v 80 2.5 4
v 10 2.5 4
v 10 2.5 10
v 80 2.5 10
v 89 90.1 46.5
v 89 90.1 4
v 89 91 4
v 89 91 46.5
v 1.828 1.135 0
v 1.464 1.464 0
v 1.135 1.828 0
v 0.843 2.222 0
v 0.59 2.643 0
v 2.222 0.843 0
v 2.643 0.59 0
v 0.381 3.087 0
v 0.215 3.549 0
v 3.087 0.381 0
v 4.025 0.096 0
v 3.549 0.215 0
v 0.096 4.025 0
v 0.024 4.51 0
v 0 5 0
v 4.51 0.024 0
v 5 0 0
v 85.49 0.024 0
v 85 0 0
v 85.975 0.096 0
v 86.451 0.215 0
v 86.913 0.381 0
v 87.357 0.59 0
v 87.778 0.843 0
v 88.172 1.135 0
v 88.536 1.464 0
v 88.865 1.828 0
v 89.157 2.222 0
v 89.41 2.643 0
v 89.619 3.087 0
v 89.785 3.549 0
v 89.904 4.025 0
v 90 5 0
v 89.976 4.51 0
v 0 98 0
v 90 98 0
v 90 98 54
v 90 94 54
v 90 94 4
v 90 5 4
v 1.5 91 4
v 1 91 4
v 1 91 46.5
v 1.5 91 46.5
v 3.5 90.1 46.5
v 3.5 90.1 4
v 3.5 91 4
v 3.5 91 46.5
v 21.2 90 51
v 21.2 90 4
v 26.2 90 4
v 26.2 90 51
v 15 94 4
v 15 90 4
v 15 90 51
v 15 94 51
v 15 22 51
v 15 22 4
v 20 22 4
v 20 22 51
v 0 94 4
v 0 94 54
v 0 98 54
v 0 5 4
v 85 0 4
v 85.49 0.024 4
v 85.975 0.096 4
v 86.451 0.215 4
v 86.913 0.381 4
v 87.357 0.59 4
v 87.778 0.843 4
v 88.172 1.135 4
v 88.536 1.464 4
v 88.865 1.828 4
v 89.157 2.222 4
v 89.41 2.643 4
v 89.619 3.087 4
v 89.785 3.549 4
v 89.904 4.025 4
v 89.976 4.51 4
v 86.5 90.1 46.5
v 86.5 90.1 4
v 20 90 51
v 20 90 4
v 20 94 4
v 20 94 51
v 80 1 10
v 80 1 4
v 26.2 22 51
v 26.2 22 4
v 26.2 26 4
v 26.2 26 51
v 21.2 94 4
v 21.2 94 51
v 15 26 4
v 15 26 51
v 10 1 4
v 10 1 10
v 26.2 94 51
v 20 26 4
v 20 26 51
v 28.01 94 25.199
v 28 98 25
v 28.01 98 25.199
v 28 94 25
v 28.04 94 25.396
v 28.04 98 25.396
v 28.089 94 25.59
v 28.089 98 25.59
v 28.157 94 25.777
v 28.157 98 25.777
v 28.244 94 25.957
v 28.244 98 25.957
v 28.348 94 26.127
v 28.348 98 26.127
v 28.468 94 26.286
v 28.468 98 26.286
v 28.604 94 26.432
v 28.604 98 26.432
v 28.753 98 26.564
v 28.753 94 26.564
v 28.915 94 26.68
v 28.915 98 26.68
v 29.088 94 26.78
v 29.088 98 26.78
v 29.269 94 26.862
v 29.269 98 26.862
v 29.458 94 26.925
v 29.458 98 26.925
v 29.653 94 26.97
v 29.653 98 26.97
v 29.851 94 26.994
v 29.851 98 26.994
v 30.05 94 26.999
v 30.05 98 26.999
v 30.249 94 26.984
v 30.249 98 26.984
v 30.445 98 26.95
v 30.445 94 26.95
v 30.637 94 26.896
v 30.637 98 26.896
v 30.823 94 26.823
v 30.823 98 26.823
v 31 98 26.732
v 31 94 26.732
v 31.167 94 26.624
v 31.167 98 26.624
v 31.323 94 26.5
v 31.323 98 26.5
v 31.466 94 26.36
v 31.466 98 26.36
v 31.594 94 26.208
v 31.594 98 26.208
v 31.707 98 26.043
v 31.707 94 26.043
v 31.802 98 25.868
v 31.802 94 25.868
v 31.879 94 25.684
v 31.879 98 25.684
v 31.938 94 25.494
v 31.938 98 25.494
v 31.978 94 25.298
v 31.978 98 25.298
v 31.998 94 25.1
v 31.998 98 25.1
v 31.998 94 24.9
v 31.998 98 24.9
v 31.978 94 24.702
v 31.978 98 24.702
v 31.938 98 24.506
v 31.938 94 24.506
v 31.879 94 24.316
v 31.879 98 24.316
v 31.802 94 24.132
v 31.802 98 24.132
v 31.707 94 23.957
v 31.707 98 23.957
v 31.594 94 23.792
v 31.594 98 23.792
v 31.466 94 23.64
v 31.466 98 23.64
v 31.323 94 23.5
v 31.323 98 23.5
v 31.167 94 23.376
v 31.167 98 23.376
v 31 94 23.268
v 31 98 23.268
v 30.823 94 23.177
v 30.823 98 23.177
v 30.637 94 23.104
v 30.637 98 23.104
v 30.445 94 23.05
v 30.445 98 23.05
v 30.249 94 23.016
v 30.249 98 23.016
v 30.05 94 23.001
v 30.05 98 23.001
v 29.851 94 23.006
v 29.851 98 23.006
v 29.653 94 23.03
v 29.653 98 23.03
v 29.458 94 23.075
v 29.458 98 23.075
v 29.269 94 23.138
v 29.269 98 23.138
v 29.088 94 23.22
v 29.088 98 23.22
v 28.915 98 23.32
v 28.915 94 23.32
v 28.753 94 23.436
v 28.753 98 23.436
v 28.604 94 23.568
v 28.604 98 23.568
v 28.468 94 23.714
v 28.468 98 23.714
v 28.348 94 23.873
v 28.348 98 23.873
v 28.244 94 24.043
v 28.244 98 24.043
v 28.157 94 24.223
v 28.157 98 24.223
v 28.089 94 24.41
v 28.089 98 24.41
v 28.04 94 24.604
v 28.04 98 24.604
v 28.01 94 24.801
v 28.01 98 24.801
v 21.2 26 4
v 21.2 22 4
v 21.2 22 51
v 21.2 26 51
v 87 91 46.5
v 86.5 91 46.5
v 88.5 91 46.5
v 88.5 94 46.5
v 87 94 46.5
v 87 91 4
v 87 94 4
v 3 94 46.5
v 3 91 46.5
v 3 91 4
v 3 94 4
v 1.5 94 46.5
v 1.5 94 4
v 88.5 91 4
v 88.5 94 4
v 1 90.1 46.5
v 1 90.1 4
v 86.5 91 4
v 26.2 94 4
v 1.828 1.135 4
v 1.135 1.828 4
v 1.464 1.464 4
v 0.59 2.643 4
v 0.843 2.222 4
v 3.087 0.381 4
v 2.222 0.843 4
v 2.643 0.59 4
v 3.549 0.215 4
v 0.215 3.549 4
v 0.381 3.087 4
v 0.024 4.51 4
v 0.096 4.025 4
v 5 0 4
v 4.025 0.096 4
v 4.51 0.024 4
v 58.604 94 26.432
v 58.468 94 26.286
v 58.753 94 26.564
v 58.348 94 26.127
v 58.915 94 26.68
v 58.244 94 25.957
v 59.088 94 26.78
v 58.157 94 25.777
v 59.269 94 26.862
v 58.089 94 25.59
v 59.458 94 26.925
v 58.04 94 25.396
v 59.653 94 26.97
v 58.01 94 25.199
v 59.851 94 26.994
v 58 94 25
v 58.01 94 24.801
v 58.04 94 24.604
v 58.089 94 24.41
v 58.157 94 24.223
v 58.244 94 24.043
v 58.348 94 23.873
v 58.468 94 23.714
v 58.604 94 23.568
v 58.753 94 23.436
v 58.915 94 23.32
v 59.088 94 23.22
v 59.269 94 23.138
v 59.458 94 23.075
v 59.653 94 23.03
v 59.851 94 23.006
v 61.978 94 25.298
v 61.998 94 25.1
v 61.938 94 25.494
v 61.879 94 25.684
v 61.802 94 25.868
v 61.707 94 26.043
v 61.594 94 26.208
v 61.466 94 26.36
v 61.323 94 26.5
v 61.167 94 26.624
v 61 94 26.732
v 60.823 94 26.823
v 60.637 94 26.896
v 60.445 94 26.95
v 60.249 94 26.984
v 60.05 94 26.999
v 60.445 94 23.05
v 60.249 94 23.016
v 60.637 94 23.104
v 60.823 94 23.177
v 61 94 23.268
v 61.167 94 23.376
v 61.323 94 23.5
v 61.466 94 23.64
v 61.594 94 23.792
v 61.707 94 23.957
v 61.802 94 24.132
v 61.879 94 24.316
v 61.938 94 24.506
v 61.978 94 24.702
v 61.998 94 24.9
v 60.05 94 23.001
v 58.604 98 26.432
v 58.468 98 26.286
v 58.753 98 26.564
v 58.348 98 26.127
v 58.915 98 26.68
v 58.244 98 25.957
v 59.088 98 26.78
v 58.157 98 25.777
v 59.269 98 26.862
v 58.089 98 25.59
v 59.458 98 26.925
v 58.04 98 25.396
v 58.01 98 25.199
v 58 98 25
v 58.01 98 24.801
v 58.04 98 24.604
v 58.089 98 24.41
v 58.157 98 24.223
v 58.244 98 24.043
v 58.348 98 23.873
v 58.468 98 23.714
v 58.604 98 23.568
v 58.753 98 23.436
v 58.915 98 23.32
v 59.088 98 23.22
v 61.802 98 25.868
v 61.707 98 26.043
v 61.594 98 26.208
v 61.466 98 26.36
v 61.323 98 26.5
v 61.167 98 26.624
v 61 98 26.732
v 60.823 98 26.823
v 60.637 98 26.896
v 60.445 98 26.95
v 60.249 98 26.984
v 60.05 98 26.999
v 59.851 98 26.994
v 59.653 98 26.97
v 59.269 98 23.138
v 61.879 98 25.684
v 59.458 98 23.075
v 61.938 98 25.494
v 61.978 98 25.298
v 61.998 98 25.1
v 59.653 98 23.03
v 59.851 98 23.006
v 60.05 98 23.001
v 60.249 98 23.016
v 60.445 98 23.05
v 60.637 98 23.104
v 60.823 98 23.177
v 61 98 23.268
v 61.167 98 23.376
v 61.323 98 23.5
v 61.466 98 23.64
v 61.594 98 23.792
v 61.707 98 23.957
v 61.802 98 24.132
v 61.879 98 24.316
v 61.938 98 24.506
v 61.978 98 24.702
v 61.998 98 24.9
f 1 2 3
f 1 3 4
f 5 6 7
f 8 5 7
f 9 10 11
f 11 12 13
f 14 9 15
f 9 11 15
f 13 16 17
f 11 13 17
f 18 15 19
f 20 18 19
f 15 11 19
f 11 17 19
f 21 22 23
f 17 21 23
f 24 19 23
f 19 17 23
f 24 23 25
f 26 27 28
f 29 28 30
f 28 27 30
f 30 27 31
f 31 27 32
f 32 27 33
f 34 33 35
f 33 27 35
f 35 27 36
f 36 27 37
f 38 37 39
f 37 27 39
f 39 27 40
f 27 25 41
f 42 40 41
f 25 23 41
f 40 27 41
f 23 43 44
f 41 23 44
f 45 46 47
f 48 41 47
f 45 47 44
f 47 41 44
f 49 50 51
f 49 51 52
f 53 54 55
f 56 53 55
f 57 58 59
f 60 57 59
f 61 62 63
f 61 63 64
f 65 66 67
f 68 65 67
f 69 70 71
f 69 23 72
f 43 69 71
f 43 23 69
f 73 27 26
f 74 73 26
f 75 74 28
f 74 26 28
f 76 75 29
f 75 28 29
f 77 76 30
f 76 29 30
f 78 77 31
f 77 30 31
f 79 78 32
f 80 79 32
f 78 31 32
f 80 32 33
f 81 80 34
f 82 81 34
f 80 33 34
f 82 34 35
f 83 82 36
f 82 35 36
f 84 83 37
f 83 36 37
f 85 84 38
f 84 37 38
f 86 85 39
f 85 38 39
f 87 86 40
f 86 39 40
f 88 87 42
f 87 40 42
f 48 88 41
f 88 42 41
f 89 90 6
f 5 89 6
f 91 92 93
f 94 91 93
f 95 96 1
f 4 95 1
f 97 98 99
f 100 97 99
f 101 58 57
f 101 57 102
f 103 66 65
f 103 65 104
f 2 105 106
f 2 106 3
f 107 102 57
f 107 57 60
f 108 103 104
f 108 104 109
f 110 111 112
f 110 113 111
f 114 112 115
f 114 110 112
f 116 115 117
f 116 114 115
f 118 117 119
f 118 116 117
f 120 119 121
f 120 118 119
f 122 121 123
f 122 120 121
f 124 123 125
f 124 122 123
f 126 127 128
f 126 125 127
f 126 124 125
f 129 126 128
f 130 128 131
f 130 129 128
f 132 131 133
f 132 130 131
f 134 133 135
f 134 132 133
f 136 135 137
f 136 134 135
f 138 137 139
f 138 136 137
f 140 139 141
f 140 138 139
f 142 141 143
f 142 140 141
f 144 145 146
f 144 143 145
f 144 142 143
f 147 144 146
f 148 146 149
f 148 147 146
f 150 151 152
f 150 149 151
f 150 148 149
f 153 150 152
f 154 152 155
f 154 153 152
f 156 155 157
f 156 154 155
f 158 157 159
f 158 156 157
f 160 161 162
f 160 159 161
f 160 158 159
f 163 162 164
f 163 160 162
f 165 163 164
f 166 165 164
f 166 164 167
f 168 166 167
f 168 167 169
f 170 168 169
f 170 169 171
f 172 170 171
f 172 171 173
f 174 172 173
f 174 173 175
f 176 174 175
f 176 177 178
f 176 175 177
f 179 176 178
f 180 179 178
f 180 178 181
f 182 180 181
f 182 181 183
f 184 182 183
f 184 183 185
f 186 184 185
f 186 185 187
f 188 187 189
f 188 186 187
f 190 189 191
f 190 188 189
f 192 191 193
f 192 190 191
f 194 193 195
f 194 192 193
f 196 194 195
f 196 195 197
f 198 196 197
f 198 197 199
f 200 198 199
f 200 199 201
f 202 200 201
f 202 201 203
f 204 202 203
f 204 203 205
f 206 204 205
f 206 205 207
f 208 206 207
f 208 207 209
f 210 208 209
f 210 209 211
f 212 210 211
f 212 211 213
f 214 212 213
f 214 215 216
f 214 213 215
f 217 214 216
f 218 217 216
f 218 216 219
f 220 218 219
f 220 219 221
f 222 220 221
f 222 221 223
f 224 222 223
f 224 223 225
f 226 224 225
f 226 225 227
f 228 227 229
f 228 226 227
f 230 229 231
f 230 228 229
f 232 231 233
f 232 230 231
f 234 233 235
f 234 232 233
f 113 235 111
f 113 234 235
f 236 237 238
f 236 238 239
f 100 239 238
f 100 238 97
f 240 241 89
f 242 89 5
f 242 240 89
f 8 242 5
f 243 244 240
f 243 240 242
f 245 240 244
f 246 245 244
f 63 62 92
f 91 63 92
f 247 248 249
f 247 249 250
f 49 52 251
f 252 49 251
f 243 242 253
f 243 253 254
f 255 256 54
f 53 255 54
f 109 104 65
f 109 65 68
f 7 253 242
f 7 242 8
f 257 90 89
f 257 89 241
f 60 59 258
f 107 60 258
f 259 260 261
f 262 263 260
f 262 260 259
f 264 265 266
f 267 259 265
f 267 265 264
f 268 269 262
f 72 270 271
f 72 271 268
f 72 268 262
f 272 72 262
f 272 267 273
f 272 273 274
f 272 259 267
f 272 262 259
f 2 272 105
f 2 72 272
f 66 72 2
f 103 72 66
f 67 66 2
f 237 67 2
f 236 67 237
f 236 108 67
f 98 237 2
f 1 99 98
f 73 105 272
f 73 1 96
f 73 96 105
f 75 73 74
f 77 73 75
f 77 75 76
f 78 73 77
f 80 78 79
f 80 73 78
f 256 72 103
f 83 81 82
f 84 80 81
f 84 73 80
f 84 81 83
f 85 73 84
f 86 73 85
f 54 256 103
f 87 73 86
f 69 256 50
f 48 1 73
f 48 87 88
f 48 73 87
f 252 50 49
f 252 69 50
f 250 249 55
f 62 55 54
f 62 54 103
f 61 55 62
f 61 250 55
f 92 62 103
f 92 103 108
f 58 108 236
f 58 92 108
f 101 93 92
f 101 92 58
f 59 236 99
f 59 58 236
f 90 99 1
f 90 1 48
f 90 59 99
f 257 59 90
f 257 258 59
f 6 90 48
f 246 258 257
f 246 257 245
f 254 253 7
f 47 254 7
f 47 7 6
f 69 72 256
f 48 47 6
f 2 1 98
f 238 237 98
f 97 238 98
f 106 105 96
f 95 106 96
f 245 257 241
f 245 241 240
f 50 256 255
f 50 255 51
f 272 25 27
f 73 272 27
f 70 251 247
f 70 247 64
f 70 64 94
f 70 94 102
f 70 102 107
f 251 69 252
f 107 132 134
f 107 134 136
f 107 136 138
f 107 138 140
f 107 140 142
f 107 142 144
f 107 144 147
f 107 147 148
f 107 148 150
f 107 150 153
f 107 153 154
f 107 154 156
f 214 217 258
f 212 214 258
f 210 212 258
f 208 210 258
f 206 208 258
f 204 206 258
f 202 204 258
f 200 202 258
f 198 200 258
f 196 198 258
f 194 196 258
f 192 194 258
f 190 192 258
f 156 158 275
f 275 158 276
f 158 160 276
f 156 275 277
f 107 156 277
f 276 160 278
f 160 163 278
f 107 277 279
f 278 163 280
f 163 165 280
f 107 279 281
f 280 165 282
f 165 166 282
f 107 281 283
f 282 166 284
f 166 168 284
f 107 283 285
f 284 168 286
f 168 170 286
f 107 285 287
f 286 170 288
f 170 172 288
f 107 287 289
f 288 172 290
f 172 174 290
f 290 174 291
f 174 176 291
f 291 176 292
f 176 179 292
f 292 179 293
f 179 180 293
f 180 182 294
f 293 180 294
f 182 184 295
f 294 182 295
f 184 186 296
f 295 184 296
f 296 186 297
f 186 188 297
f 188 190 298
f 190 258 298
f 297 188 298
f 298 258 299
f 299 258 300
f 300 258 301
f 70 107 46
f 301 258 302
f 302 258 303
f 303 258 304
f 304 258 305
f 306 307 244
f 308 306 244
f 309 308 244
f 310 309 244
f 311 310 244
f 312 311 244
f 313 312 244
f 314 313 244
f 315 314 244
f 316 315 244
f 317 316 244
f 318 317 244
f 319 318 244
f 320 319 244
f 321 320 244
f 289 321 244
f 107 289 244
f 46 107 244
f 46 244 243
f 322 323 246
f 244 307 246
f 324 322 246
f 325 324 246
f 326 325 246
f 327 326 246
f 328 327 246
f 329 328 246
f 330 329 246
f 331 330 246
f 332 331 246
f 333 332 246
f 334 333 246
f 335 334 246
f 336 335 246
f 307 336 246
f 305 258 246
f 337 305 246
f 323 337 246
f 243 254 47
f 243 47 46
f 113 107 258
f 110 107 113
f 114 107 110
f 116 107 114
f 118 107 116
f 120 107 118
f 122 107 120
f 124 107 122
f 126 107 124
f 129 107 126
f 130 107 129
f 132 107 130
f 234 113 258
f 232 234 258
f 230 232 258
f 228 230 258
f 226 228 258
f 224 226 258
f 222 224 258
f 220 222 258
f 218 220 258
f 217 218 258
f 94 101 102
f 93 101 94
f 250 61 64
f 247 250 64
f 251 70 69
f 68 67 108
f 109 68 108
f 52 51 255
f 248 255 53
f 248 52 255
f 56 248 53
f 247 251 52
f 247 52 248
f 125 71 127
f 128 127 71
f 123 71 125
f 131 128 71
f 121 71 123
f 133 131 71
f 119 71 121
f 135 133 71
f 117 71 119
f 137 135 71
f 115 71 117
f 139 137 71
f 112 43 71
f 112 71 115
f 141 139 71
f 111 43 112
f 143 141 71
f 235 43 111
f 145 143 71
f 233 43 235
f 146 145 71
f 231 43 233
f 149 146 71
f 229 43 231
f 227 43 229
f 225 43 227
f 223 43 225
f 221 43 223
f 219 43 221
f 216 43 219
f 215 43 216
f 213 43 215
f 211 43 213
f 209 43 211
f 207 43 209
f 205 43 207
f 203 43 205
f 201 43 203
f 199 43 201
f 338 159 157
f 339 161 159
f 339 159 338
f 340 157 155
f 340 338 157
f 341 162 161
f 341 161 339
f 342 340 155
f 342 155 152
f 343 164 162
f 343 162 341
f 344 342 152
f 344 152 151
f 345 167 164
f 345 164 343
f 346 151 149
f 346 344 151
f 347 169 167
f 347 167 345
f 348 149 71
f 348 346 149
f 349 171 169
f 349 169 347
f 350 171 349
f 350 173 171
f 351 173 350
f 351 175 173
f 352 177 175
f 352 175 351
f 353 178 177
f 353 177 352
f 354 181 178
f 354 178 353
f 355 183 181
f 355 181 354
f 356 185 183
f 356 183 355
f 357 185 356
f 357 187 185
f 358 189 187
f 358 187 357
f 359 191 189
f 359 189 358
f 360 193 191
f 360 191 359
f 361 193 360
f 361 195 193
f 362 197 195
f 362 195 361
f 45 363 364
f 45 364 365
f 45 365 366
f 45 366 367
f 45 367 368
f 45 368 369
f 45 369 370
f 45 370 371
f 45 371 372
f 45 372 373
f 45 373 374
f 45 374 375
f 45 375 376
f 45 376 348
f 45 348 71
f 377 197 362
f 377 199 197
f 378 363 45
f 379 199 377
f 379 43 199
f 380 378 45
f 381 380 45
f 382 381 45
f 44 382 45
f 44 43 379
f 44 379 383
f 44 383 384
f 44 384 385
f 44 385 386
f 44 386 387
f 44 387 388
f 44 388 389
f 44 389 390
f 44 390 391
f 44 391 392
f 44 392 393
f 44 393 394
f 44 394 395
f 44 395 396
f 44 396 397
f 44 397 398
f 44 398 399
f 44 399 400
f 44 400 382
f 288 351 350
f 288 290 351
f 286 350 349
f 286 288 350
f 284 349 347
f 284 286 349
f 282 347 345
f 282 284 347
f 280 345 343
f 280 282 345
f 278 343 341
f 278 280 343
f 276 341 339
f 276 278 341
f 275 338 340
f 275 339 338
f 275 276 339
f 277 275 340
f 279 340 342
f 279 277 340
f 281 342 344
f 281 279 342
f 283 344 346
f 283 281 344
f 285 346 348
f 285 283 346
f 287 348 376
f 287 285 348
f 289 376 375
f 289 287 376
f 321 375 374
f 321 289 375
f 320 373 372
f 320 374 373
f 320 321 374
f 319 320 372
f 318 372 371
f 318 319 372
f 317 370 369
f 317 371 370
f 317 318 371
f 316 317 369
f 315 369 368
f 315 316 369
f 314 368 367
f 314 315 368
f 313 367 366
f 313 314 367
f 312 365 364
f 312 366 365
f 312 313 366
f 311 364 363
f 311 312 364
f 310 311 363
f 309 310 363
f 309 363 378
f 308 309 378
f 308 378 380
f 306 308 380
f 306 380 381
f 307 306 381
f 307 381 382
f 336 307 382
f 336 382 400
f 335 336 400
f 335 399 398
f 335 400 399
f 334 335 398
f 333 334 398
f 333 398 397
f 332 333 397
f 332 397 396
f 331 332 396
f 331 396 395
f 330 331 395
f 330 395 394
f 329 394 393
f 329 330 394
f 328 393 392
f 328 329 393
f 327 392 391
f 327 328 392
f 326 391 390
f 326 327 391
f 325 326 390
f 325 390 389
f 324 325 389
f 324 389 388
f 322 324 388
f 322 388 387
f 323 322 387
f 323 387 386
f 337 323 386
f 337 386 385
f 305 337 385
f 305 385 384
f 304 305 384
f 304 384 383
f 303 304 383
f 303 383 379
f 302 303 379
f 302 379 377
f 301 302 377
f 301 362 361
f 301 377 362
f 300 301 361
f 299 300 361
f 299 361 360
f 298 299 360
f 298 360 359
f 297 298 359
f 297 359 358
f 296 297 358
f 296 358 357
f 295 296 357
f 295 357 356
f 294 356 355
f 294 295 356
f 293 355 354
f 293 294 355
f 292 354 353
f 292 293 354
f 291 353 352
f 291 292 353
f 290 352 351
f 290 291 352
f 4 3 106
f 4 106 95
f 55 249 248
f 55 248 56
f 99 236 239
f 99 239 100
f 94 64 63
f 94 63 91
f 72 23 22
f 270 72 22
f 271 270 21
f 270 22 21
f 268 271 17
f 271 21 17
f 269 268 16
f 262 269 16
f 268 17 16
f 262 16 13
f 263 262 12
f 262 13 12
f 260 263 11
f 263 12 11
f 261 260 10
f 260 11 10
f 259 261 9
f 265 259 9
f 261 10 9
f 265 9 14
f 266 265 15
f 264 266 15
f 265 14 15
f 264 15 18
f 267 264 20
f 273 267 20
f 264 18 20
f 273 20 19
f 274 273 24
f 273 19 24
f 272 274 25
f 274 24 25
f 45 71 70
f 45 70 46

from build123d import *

# Parameters (mm, degrees)
PAD_DEPTH         = 4
SKETCH002_W       = 90
SKETCH002_H       = 4
PAD001_DEPTH      = 54
SKETCH001_W       = 5
SKETCH001_H       = 4
PAD002_DEPTH      = 51
SKETCH005_R       = 2
POCKET_DEPTH      = 84.001
POCKET_DEPTH_BACK = -14.001
SKETCH004_W       = 70
SKETCH004_H       = 1.5
PAD003_DEPTH      = 10
SKETCH003_W       = 1.5
SKETCH003_H       = 3
SKETCH003_W_2     = 2.5
SKETCH003_H_2     = 0.9
PAD004_DEPTH      = 46.5


with BuildPart() as part:
    # Sketch → Pad (new body)
    with BuildSketch(Plane.XY):
        with BuildLine():
            Line((0, 94), (0, 5))
            ThreePointArc((0, 5), (1.464466, 1.464466), (5, 0))
            Line((5, 0), (85, 0))
            ThreePointArc((85, 0), (88.535534, 1.464466), (90, 5))
            Line((90, 5), (90, 94))
            Line((90, 94), (0, 94))
        make_face()
    extrude(amount=PAD_DEPTH)

    # Sketch002 → Pad001 (join)
    with BuildSketch(Plane.XY):
        with Locations((45, 96)):
            Rectangle(SKETCH002_W, SKETCH002_H)
    extrude(amount=PAD001_DEPTH)

    # Sketch001 → Pad002 (join)
    with BuildSketch(Plane.XY):
        with Locations((17.5, 92)):
            Rectangle(SKETCH001_W, SKETCH001_H)
        with Locations((17.5, 24)):
            Rectangle(SKETCH001_W, SKETCH001_H)
        with Locations((23.7, 92)):
            Rectangle(SKETCH001_W, SKETCH001_H)
        with Locations((23.7, 24)):
            Rectangle(SKETCH001_W, SKETCH001_H)
    extrude(amount=PAD002_DEPTH)

    # Sketch005 → Pocket (cut, two sides)
    with BuildSketch(Plane(origin=(0, 84, 0), x_dir=(-1, 0, 0), z_dir=(0, 1, 0))) as pocket_sk:
        with Locations((-30, 25)):
            Circle(SKETCH005_R)
        with Locations((-60, 25)):
            Circle(SKETCH005_R)
    extrude(amount=-POCKET_DEPTH, mode=Mode.SUBTRACT)
    extrude(pocket_sk.sketch, amount=-POCKET_DEPTH_BACK, mode=Mode.SUBTRACT)

    # Sketch004 → Pad003 (join)
    with BuildSketch(Plane.XY):
        with Locations((45, 1.75)):
            Rectangle(SKETCH004_W, SKETCH004_H)
    extrude(amount=PAD003_DEPTH)

    # Sketch003 → Pad004 (join)
    with BuildSketch(Plane.XY):
        with Locations((2.25, 92.5)):
            Rectangle(SKETCH003_W, SKETCH003_H)
        with Locations((2.25, 90.55)):
            Rectangle(SKETCH003_W_2, SKETCH003_H_2)
        with Locations((87.75, 92.5)):
            Rectangle(SKETCH003_W, SKETCH003_H)
        with Locations((87.75, 90.55)):
            Rectangle(SKETCH003_W_2, SKETCH003_H_2)
    extrude(amount=PAD004_DEPTH)


solid = part.part
